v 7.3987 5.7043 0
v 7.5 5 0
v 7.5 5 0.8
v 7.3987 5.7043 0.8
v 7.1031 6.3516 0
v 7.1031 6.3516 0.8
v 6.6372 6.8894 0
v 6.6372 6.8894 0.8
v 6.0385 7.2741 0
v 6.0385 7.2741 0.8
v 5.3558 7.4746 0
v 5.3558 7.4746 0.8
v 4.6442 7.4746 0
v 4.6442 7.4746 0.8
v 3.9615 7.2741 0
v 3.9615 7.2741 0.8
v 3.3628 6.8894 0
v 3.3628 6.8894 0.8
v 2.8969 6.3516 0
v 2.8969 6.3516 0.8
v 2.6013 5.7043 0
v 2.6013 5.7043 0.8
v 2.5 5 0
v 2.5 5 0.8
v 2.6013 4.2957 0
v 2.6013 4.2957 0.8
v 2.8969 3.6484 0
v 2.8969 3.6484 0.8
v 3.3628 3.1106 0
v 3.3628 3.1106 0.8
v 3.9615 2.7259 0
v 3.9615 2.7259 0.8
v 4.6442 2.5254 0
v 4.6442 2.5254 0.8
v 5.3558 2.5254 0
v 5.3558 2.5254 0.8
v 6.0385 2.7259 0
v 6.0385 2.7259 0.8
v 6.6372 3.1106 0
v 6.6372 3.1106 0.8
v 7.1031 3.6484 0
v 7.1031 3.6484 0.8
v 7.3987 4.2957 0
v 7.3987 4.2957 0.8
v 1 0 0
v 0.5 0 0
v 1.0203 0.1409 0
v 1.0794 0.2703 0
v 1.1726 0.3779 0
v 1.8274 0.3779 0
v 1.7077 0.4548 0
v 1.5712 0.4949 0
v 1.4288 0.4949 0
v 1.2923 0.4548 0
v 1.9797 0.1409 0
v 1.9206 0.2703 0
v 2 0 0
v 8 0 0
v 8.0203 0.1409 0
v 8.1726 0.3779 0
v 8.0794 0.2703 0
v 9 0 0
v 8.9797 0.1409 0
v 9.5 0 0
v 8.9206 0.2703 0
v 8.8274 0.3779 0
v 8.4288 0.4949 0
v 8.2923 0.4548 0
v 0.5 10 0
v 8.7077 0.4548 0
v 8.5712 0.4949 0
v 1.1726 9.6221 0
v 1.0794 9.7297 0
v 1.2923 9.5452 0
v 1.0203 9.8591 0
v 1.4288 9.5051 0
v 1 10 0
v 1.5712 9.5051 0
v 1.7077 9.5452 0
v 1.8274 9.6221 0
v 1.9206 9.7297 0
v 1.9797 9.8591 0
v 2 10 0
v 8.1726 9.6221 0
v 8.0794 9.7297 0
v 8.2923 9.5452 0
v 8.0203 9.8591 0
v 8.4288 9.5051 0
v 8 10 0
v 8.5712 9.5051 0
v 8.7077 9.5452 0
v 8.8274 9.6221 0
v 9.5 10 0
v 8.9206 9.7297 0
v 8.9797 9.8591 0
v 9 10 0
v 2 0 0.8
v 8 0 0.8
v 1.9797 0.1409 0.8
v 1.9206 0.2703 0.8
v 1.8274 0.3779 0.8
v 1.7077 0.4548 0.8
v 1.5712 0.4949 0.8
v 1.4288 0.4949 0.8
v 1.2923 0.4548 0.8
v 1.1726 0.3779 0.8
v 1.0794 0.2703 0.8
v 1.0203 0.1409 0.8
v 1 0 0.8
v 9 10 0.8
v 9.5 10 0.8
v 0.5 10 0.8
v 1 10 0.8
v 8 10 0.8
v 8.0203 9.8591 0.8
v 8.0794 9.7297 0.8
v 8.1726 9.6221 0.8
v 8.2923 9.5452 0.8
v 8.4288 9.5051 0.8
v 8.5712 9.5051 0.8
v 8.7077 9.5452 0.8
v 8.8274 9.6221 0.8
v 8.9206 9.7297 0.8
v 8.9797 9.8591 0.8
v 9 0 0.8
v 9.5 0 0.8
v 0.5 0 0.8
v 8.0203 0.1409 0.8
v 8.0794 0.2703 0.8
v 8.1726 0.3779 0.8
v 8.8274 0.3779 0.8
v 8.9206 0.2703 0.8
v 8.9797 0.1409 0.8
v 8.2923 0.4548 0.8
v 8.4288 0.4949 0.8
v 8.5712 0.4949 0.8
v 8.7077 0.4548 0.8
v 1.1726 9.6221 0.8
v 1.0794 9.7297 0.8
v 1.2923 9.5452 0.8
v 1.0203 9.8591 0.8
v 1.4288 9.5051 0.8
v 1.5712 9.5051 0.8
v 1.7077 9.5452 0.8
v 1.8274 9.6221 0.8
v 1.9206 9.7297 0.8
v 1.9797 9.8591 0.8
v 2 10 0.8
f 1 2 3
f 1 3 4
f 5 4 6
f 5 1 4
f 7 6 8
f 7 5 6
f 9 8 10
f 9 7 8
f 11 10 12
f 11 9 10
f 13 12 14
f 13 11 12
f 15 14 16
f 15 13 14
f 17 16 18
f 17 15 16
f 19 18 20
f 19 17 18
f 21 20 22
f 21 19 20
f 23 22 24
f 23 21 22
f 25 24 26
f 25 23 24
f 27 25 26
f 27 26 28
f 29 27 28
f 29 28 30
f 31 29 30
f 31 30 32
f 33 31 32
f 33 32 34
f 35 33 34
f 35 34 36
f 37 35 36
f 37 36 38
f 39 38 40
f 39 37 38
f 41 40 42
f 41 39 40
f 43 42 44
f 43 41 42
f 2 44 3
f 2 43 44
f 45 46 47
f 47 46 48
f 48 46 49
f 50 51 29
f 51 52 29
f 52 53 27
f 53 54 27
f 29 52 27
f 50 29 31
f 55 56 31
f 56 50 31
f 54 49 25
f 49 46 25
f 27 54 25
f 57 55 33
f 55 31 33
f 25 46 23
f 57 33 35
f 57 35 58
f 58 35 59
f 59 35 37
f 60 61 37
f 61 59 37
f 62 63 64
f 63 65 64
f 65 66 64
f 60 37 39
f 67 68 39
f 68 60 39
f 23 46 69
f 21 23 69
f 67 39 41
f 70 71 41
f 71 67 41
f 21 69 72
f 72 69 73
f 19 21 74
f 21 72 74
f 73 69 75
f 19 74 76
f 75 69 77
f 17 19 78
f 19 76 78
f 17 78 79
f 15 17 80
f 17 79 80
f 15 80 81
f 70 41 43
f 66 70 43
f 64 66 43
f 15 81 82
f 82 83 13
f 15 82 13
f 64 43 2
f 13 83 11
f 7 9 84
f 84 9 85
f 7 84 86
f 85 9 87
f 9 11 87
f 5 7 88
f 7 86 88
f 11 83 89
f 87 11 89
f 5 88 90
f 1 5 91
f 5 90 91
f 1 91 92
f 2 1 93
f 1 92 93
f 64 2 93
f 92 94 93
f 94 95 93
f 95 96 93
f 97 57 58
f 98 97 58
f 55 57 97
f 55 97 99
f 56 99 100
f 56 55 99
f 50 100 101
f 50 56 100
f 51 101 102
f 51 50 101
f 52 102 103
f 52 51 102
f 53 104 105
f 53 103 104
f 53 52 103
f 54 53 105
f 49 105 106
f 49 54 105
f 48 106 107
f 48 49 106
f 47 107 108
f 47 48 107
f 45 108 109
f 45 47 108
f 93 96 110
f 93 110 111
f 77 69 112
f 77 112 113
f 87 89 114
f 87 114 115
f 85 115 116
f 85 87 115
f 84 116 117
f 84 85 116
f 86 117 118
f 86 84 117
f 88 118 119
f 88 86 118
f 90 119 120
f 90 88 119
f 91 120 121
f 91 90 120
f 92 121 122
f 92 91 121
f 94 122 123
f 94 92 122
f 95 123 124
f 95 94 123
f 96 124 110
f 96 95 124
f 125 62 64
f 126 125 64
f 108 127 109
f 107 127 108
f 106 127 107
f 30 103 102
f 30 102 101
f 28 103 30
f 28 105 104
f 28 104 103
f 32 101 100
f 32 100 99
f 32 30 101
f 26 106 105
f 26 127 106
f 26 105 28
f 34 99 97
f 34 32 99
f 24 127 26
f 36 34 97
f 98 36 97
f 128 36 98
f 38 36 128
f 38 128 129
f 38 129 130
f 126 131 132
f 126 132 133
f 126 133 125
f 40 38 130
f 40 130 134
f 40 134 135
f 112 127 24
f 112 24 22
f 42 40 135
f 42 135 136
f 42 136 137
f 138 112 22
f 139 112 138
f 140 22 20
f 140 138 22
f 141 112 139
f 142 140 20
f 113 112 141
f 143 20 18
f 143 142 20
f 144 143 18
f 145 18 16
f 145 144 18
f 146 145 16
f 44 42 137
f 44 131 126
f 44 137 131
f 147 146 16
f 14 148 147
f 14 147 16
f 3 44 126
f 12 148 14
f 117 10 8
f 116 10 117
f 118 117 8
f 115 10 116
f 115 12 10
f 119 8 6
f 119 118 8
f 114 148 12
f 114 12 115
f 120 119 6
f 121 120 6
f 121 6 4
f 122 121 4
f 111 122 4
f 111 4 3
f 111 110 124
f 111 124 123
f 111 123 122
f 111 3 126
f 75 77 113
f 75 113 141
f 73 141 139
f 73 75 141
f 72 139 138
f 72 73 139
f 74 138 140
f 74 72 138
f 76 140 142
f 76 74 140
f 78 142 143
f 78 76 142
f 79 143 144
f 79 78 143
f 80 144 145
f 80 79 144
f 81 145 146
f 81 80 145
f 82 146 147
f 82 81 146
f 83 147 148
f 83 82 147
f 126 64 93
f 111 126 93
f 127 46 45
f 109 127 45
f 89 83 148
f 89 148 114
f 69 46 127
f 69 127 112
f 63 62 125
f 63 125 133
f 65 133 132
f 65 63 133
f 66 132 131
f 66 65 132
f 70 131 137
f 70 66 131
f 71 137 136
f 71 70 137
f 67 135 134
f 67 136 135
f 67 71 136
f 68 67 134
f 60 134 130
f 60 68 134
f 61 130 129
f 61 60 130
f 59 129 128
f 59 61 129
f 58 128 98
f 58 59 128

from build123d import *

# Parameters (mm, degrees)
SKETCH1_W              = 9
SKETCH1_H              = 10
BOARD_DEPTH            = 0.8
SKETCH2_R              = 2.5
NON_PLATED_HOLES_DEPTH = 14.816294728
SKETCH3_R              = 0.5
PLATED_HOLES_DEPTH     = 14.816294728


with BuildPart() as part:
    # Sketch1 → BOARD (new body)
    with BuildSketch(Plane.XY):
        with Locations((5, 5)):
            Rectangle(SKETCH1_W, SKETCH1_H)
    extrude(amount=BOARD_DEPTH)

    # Sketch2 → NON-PLATED HOLES (cut, through all)
    with BuildSketch(Plane.XY):
        with Locations((5, 5)):
            Circle(SKETCH2_R)
    extrude(amount=NON_PLATED_HOLES_DEPTH, mode=Mode.SUBTRACT)

    # Sketch3 → PLATED HOLES (cut, through all)
    with BuildSketch(Plane.XY):
        with Locations((1.5, 0)):
            Circle(SKETCH3_R)
        with Locations((1.5, 10)):
            Circle(SKETCH3_R)
        with Locations((8.5, 10)):
            Circle(SKETCH3_R)
        with Locations((8.5, 0)):
            Circle(SKETCH3_R)
    extrude(amount=PLATED_HOLES_DEPTH, mode=Mode.SUBTRACT)


solid = part.part
